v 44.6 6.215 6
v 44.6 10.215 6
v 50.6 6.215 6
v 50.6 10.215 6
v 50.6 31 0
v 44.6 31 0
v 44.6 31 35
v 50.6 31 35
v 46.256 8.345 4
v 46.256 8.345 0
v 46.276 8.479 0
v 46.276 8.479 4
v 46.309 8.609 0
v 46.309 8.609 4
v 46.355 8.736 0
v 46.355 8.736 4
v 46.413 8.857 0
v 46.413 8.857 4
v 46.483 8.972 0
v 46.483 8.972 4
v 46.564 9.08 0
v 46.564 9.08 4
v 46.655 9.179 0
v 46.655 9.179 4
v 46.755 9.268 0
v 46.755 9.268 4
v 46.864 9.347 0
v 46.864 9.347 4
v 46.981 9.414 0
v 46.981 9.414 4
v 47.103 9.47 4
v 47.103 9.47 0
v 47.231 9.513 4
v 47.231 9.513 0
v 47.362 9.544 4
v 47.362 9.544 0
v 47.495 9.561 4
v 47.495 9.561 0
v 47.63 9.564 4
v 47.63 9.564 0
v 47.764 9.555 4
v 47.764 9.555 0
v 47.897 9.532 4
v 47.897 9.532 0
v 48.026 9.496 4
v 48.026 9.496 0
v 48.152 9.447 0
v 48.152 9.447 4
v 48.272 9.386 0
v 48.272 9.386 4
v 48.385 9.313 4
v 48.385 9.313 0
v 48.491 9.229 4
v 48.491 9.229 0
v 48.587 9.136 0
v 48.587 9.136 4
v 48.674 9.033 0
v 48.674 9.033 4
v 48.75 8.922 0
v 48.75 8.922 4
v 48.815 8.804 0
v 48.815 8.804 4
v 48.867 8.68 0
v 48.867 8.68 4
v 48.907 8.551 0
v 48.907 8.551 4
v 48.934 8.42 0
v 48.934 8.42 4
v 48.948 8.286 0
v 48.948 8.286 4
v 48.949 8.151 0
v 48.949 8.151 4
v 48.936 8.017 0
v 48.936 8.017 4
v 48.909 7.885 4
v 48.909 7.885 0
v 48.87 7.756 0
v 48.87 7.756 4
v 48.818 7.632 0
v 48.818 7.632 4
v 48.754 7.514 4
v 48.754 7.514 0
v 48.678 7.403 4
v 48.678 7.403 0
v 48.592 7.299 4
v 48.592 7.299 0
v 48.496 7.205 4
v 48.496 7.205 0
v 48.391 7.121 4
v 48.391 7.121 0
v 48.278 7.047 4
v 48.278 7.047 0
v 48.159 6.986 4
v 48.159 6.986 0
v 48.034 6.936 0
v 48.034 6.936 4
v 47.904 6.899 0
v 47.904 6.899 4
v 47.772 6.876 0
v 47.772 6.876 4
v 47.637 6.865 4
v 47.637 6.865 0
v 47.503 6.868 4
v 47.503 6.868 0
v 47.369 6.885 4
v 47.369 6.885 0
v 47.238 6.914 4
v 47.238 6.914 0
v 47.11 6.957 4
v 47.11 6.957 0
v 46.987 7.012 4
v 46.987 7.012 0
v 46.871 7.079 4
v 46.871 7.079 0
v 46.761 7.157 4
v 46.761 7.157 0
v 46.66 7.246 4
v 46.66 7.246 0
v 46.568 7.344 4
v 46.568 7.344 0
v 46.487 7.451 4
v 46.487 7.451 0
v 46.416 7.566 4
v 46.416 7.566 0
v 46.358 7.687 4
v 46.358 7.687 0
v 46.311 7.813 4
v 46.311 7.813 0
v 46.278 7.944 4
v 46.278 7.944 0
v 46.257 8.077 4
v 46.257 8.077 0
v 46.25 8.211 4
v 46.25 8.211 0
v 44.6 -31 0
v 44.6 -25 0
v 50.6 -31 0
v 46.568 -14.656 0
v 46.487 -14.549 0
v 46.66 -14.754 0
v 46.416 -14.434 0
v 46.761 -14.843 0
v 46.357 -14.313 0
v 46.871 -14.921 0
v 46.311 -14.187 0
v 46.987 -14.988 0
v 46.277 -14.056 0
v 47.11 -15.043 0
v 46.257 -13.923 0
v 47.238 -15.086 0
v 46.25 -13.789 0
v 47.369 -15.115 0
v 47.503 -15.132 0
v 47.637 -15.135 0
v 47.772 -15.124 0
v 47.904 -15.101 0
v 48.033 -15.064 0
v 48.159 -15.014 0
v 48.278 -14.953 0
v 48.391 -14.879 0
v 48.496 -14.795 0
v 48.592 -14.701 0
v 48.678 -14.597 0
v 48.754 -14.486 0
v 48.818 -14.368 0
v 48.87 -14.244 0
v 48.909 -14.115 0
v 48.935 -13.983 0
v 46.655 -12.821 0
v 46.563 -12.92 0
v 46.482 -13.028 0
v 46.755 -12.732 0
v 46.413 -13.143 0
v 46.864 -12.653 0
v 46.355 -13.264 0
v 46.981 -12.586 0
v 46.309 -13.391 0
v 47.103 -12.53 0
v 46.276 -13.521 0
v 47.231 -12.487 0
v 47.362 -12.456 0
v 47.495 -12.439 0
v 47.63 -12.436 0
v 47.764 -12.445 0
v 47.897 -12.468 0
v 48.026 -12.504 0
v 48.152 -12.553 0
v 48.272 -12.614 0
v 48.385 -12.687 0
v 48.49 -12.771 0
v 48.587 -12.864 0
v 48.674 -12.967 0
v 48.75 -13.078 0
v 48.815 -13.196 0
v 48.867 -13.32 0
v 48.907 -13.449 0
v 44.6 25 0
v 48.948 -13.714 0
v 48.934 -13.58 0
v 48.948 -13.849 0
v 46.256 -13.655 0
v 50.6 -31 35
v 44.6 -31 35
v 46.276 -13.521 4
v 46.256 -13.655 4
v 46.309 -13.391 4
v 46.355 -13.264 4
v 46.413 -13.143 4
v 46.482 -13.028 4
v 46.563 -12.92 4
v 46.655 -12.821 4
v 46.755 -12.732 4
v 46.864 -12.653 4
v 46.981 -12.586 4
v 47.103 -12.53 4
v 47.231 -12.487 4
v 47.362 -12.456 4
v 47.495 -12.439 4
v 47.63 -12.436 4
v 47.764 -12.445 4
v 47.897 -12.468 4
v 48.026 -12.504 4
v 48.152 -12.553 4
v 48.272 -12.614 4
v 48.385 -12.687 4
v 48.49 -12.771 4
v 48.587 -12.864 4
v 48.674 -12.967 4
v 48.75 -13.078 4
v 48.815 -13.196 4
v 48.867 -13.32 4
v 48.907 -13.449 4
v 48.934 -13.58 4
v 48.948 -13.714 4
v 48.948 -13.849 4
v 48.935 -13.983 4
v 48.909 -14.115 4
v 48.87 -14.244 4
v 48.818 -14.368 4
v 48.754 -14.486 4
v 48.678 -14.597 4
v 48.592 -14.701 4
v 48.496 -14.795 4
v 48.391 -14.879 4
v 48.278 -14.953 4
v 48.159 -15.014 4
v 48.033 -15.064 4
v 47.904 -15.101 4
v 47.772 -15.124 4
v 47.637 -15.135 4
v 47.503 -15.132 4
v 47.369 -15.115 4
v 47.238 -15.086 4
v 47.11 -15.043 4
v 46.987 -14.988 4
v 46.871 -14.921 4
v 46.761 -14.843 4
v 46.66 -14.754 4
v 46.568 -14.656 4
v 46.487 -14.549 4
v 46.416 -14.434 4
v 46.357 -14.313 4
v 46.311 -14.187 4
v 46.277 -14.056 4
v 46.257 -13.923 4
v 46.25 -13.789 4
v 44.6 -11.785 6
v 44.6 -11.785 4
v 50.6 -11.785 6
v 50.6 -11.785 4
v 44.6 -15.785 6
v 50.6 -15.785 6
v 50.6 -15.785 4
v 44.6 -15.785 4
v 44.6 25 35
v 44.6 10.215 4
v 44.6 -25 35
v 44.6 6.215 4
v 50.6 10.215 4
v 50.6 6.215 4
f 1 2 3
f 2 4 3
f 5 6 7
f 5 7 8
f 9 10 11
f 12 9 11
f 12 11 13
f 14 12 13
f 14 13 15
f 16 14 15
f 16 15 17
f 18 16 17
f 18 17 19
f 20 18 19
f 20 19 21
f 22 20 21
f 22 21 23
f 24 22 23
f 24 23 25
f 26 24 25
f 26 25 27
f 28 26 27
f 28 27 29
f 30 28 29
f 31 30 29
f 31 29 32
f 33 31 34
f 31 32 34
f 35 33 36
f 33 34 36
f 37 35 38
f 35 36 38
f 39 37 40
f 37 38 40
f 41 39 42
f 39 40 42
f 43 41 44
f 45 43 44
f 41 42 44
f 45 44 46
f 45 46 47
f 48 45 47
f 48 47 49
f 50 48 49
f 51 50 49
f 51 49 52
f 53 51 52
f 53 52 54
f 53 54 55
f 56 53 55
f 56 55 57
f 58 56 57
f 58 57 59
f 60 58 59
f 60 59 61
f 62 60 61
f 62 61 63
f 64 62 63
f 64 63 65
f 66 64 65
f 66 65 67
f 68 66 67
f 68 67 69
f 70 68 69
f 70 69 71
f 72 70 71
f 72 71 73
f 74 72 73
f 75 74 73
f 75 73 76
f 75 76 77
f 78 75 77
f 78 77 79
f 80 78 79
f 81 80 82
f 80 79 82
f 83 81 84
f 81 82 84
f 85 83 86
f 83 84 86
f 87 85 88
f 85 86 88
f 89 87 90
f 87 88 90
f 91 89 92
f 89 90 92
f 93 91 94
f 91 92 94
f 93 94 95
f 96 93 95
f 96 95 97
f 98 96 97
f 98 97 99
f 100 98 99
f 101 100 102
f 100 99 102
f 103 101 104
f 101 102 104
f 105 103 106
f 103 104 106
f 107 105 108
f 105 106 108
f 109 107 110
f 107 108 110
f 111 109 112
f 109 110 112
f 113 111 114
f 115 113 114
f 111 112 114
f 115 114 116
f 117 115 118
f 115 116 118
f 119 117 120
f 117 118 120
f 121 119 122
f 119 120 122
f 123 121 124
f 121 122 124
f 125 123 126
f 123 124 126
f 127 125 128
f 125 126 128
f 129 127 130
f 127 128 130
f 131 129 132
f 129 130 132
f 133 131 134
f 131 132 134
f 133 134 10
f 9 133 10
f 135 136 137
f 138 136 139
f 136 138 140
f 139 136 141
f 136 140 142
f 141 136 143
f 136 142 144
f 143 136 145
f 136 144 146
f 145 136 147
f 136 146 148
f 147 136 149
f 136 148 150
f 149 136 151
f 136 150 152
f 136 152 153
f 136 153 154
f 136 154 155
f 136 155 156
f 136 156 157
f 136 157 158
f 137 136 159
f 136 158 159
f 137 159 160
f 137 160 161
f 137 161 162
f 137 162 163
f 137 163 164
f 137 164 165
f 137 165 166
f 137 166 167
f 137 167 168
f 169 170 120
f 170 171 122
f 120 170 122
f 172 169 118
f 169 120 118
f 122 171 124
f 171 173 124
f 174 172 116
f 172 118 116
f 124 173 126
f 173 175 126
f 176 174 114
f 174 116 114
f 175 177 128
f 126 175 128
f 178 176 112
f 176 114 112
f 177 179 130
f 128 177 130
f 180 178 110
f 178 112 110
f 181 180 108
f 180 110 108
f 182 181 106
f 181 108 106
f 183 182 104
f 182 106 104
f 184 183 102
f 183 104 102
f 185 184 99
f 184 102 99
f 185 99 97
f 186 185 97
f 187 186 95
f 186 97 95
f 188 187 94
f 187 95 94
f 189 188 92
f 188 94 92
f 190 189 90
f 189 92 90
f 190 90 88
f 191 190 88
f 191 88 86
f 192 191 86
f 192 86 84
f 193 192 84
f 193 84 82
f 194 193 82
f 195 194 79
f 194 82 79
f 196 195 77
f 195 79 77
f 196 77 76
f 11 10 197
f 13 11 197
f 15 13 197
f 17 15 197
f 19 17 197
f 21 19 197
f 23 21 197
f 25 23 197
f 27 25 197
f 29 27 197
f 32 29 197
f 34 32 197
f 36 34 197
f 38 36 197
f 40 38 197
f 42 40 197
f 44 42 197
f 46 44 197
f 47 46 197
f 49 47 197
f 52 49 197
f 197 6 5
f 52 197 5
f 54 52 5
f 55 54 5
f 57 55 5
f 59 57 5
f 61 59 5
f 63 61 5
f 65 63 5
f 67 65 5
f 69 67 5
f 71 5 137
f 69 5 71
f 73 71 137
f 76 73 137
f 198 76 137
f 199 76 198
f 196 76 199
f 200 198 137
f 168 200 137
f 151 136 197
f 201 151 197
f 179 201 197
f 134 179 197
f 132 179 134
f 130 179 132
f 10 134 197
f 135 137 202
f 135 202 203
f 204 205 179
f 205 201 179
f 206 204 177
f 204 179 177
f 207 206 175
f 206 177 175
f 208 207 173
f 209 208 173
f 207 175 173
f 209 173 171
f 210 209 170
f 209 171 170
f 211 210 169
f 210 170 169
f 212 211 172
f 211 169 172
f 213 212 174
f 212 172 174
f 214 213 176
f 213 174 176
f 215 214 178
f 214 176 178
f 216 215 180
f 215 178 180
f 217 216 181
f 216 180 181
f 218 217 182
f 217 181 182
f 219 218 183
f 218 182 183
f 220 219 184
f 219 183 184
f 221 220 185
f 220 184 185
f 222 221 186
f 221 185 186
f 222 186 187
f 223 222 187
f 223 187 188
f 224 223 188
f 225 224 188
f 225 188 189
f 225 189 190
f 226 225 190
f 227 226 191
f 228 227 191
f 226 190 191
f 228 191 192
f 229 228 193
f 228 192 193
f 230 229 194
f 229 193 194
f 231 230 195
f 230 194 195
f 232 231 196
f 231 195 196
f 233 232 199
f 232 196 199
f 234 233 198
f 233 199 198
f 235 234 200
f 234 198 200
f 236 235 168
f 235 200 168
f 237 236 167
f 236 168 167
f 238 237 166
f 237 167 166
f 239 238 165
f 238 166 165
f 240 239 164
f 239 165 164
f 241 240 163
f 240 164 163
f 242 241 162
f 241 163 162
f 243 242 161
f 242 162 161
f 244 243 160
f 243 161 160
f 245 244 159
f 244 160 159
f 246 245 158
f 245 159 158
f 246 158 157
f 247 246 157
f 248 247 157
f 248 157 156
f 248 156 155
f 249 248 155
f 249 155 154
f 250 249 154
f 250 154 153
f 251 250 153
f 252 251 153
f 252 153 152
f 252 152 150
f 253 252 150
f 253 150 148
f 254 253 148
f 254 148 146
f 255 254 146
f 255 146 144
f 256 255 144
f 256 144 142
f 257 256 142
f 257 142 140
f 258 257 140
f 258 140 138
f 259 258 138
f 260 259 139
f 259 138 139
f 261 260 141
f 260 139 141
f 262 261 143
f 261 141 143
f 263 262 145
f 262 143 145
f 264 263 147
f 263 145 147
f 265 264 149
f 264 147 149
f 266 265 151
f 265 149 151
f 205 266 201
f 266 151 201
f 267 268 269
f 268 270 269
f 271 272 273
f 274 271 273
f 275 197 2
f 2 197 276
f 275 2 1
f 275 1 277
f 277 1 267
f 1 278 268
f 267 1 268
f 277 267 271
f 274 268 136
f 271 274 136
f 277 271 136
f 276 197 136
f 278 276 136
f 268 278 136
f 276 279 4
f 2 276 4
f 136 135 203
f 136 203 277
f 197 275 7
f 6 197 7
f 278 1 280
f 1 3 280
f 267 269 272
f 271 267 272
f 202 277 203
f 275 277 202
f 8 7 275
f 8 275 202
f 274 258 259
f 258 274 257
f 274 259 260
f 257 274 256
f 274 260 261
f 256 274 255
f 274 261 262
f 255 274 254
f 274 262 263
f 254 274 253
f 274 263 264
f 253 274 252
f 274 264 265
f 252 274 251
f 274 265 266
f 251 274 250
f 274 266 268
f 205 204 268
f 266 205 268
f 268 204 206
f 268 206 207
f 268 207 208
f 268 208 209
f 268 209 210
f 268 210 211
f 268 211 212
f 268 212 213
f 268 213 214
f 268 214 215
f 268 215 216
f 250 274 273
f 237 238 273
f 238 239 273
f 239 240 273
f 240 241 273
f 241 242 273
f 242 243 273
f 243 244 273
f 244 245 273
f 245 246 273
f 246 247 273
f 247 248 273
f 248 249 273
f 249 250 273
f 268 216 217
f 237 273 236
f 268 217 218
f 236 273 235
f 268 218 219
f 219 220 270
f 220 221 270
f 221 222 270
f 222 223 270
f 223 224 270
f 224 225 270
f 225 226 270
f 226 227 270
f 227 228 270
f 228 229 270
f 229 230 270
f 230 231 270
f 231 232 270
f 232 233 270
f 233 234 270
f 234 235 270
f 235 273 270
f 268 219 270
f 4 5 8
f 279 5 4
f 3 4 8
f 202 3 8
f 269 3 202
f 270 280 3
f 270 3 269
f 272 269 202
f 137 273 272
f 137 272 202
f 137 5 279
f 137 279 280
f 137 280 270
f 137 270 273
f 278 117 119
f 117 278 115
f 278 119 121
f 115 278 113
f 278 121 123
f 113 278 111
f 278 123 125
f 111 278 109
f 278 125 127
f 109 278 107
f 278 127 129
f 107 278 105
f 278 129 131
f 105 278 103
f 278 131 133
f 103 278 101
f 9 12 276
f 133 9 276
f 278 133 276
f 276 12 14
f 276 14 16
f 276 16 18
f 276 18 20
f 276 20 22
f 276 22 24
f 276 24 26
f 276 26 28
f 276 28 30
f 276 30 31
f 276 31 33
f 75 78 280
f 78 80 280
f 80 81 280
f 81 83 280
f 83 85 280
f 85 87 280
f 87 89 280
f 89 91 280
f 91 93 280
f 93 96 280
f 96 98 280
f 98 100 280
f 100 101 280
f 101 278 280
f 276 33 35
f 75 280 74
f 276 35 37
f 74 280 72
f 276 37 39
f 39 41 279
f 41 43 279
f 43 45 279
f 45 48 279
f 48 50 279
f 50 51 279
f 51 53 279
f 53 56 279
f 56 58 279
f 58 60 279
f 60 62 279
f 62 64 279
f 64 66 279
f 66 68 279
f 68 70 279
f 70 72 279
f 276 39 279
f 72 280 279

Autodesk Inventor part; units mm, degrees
ref_plane "YZ Plane" through (0, 0, 0) normal (1, 0, 0) x (0, 1, 0)
ref_plane "XZ Plane" through (0, 0, 0) normal (0, 1, 0) x (-1, 0, 0)
ref_plane "XY Plane" through (0, 0, 0) normal (0, 0, 1) x (1, 0, 0)
ref_plane "작업 평면2" through (-1.8693, 3.0801, 0) normal (0, 0, 1) x (0.9953009, -0.0968305, 0)
sketch "스케치1" plane through (-1.8693, 3.0801, 0) normal (0, 0, 1) x (0.9953009, -0.0968305, 0)
  line L0 (44.1285, 26.3164) -> (48.97, -23.4487) projected
  line L1 (49.551, -29.4205) -> (48.97, -23.4487) projected
  line L2 (55.5228, -28.8395) -> (-45.2017, -38.6387) projected
  line L3 (49.5193, 32.8692) -> (55.5228, -28.8395) projected
  line L4 (-51.2052, 23.0699) -> (49.5193, 32.8692) projected
  line L5 (44.1285, 26.3164) -> (43.5475, 32.2882) projected
  point P0 (2.1588, -2.8846)
extrude "돌출1" add sketch "스케치1" along normal blind 35
sketch "스케치2" plane through (-1.8693, 3.0801, 0) normal (0, 0, -1) x (-0.9953009, 0.0968305, 0)
  circle A0 centre (-48.7397, 9.9006) radius 1.35 projected
  circle A1 centre (-50.8699, -11.996) radius 1.35 projected
  point P0 (-2.1588, -2.8846)
extrude "돌출2" cut sketch "스케치2" against normal blind 5
ref_plane "작업 평면3" through (50.6, -31.0001, 0) normal (1, 0, 0) x (0, 0, -1)
sketch "스케치3" plane through (50.6, -31.0001, 0) normal (1, 0, 0) x (0, 0, -1)
  line L0 (-5, 40.5649) -> (-5, 37.8649) projected
  line L1 (-5, 18.5649) -> (-5, 15.8649) projected
  line L2 (-4, 0) -> (-4, 6) projected
  line L3 (-4, 1.65) -> (0, 1.65)
  line L4 (-4, 4.35) -> (0, 4.35)
  line L5 (-4, 37.2149) -> (-4, 41.2149)
  line L6 (-4, 41.2149) -> (-6, 41.2149)
  line L7 (-6, 41.2149) -> (-6, 37.2149)
  line L8 (-6, 37.2149) -> (-4, 37.2149)
  line L9 (-4, 37.2149) -> (-6, 41.2149) construction
  line L10 (-4, 41.2149) -> (-6, 37.2149) construction
  line L11 (-4, 15.2149) -> (-4, 19.2149)
  line L12 (-4, 19.2149) -> (-6, 19.2149)
  line L13 (-6, 19.2149) -> (-6, 15.2149)
  line L14 (-6, 15.2149) -> (-4, 15.2149)
  line L15 (-4, 15.2149) -> (-6, 19.2149) construction
  line L16 (-4, 19.2149) -> (-6, 15.2149) construction
  point P0 (0, 31.0001)
  point P1 (-5, 39.2149)
  point P2 (-5, 17.2149)
  dimension "d4" = 4
  dimension "d5" = 2
  dimension "d6" = 4
extrude "돌출3" cut sketch "스케치3" against normal up to surface (6 mm away)
properties part number "_head_adt_2" material "PMMA 플라스틱"
